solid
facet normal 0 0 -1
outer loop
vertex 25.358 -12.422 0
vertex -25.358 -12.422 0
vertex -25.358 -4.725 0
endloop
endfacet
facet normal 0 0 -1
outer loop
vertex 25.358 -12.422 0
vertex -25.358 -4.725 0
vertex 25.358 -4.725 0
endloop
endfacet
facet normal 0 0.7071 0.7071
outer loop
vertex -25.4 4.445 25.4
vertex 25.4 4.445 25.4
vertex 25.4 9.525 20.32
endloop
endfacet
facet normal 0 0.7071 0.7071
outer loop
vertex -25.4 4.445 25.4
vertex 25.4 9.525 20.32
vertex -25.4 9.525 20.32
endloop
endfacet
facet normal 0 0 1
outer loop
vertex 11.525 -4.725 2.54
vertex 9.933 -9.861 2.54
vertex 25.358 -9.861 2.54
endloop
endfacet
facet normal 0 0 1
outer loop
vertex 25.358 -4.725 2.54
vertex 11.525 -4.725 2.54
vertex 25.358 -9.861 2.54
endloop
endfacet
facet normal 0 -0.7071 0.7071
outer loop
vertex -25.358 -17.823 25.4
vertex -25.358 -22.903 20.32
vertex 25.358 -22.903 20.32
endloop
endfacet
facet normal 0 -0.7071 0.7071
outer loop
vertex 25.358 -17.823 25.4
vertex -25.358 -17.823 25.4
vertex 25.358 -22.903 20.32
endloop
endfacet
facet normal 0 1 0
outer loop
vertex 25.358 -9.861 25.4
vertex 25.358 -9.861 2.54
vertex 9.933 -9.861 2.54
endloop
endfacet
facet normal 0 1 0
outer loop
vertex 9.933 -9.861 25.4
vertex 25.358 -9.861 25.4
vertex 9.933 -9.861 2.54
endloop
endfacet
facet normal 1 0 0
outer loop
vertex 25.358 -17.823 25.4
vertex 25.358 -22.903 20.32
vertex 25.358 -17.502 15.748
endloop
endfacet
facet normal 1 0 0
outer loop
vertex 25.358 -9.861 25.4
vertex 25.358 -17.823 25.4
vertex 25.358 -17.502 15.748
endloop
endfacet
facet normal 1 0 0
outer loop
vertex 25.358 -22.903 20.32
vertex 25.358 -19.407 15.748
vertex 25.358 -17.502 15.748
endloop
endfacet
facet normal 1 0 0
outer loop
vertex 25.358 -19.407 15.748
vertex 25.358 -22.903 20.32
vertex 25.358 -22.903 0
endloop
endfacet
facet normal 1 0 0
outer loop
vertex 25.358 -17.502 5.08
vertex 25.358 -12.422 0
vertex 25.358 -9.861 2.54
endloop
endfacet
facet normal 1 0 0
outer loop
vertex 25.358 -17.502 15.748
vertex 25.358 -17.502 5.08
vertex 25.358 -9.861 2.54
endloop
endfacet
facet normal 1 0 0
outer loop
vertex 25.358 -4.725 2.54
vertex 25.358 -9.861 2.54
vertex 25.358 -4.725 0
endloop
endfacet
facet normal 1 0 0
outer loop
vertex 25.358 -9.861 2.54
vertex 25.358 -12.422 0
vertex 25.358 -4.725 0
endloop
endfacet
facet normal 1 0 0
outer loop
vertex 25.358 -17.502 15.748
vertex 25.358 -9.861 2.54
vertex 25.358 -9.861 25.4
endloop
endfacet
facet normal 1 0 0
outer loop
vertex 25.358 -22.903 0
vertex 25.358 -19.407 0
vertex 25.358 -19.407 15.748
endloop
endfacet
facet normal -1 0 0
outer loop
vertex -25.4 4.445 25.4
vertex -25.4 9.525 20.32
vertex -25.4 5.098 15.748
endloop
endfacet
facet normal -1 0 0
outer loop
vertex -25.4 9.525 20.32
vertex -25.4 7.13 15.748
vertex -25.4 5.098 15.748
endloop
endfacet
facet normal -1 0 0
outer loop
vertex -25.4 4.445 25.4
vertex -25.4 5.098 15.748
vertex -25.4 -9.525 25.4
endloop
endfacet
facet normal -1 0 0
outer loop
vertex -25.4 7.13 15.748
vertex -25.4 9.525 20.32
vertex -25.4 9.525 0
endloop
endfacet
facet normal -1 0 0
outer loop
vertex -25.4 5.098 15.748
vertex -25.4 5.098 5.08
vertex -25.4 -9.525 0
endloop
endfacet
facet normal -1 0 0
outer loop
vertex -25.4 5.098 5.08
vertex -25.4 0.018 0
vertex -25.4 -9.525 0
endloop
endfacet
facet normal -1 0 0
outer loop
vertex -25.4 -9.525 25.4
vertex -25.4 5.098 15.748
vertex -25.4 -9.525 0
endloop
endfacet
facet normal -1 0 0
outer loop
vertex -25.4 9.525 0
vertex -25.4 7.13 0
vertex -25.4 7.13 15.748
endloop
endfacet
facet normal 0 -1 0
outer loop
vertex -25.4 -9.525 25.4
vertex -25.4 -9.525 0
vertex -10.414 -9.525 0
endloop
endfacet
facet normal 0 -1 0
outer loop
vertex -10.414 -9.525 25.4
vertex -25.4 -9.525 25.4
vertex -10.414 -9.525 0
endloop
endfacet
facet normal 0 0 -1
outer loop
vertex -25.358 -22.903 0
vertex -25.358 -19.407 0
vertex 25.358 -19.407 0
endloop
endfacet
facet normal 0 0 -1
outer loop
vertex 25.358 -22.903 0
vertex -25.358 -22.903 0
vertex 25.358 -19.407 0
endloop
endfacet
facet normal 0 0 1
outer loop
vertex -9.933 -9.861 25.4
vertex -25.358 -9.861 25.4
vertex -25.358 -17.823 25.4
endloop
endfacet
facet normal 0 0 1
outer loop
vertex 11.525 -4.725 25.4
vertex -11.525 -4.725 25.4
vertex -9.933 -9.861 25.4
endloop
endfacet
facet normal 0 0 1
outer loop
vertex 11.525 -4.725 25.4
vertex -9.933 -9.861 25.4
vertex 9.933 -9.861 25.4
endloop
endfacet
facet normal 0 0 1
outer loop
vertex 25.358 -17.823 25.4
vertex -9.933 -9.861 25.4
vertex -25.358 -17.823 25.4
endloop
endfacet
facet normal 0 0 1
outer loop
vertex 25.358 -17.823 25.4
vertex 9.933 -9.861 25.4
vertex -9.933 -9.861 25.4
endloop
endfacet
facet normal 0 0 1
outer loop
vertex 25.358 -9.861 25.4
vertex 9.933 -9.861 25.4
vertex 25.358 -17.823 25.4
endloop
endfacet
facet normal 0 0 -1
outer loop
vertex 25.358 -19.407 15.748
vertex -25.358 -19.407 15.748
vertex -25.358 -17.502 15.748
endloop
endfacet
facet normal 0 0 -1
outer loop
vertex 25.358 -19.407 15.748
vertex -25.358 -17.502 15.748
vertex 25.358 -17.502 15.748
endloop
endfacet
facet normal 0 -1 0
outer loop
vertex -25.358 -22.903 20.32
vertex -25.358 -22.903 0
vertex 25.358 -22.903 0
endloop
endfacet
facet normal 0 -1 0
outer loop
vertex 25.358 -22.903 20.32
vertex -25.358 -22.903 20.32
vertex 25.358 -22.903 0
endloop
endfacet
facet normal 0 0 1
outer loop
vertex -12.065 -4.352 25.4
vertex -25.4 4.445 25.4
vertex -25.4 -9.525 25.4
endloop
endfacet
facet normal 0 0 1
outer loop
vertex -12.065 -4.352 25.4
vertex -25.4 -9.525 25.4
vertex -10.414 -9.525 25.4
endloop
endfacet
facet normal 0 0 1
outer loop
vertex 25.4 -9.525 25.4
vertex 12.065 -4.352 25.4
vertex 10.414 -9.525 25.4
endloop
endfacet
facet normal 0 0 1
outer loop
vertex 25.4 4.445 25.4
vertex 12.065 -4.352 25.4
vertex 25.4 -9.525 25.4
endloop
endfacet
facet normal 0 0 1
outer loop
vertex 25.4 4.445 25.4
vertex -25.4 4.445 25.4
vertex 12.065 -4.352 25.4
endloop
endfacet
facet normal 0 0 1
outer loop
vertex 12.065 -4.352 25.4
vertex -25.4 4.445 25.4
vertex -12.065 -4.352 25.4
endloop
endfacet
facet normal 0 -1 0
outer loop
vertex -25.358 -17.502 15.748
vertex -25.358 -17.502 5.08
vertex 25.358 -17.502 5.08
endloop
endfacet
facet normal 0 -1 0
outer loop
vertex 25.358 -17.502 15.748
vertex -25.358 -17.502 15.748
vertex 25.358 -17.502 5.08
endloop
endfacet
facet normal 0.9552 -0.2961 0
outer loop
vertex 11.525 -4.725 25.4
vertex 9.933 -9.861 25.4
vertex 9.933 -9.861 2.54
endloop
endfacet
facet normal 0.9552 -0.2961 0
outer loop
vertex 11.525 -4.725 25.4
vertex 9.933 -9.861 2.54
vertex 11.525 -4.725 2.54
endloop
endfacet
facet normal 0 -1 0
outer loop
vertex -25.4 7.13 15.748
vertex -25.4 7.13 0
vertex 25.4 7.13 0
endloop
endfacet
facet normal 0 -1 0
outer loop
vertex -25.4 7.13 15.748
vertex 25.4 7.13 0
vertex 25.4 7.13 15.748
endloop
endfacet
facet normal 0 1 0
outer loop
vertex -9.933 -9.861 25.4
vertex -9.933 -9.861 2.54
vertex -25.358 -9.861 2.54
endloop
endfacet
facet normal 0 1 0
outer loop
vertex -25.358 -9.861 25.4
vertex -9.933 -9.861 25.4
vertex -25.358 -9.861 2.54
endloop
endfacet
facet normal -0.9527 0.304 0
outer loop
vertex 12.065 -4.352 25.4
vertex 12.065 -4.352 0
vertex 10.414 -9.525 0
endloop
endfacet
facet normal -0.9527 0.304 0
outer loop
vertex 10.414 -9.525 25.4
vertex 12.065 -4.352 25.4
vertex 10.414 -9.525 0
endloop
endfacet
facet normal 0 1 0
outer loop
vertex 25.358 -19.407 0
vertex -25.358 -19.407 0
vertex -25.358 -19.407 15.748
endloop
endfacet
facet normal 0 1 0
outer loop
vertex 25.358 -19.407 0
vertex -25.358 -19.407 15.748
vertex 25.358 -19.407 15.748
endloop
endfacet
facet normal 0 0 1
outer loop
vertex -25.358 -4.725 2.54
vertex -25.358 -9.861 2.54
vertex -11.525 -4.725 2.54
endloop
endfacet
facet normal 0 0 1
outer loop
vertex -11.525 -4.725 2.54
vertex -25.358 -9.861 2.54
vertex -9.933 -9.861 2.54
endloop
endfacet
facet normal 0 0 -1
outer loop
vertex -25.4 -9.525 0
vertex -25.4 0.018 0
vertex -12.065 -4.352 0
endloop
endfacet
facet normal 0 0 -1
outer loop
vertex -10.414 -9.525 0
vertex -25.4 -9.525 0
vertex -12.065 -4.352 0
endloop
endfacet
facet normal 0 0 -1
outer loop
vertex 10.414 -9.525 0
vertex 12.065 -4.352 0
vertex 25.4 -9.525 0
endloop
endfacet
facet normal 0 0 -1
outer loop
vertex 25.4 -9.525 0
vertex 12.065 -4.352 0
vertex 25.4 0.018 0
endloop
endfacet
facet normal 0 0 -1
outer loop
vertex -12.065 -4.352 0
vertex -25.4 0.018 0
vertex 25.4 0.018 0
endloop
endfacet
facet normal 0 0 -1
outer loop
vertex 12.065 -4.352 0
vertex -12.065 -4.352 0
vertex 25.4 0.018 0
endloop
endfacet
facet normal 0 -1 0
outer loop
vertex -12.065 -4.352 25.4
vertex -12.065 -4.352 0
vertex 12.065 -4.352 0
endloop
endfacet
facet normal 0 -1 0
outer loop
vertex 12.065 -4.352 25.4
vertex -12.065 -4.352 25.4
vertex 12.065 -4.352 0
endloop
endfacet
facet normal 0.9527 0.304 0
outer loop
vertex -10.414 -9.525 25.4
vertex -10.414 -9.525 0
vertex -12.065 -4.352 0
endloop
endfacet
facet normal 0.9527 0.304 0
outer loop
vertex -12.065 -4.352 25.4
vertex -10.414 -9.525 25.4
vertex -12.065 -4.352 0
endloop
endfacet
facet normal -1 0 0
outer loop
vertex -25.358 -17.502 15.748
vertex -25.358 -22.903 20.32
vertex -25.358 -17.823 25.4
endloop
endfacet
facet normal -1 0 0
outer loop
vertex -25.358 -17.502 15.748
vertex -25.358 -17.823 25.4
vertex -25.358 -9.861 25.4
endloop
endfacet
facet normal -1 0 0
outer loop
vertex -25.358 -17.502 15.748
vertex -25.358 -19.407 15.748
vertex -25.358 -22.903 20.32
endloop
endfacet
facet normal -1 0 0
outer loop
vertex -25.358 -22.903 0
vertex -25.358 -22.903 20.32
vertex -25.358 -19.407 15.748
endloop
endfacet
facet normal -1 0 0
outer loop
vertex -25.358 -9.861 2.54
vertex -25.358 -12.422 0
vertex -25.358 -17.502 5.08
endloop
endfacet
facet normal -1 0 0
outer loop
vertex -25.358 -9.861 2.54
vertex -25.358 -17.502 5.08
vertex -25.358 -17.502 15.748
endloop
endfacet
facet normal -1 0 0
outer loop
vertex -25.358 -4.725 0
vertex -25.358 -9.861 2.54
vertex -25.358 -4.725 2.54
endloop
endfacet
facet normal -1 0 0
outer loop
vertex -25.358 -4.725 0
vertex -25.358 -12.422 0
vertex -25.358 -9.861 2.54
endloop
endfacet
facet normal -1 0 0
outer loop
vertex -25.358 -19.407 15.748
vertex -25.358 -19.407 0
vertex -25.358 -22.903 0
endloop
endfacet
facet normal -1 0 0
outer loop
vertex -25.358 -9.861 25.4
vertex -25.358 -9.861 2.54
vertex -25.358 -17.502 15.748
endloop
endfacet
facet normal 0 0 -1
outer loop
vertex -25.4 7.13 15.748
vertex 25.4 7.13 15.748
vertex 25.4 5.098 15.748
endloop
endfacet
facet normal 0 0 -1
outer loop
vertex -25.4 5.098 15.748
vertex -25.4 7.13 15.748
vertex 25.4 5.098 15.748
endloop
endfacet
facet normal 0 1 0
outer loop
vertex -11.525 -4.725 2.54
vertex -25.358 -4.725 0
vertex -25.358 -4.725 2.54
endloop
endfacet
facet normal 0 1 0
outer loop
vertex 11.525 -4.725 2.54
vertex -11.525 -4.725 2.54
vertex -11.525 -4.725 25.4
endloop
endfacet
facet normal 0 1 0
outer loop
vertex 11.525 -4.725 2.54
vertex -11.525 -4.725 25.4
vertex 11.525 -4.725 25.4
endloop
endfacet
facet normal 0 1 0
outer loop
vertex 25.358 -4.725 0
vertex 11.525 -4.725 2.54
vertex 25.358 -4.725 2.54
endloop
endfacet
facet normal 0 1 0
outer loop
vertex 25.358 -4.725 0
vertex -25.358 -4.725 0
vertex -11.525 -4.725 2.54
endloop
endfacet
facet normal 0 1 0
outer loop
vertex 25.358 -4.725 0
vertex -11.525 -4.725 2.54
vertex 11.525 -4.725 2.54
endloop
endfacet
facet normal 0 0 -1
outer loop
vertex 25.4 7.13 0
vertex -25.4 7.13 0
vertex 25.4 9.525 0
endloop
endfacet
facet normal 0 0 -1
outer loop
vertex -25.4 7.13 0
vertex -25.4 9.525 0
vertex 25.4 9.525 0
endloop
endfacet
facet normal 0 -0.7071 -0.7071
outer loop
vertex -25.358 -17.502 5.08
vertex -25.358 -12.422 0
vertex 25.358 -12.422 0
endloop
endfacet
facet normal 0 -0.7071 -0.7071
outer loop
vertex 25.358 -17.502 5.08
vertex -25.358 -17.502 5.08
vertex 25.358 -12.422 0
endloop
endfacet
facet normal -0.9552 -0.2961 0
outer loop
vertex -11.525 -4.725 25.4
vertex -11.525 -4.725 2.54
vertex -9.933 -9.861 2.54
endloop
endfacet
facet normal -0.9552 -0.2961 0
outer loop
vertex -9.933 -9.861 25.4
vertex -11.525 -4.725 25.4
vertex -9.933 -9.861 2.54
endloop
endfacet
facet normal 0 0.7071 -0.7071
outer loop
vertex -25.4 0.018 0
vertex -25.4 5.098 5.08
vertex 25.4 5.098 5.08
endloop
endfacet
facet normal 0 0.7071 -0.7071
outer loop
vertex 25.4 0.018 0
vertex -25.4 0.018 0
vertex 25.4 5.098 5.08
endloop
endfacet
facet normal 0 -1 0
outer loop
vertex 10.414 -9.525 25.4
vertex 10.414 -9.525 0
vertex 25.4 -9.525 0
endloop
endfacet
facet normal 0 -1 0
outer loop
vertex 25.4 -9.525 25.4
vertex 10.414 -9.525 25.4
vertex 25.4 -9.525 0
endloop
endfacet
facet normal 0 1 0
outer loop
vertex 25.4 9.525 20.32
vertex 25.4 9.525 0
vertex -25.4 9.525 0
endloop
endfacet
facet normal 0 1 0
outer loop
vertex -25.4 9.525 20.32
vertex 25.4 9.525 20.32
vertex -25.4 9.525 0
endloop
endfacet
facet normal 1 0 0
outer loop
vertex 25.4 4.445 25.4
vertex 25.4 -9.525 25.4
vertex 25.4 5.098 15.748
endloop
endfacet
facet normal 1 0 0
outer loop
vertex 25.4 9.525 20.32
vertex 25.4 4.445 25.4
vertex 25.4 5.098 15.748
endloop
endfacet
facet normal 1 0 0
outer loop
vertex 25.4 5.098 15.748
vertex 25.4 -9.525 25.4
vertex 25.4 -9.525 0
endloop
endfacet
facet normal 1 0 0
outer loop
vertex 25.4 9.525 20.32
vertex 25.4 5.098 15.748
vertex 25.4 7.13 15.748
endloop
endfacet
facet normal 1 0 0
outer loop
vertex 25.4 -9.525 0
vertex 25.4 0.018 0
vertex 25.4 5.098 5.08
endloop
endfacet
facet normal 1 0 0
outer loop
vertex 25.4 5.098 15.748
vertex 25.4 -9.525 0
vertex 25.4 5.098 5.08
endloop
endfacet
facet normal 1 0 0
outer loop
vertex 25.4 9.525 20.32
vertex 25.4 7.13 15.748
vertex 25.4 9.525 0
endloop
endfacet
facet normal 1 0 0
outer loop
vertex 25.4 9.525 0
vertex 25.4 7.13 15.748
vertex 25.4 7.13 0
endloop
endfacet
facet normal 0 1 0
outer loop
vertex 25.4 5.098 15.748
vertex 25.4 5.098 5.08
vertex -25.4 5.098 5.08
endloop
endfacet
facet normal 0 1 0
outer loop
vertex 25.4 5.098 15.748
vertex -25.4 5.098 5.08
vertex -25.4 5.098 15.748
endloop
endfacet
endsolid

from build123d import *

# Parameters (mm, degrees)
F1_DEPTH  = 25.4
F2_W      = 2.032
F2_H      = 15.748
F3_DEPTH  = 68.326
F4_SIZE   = 5.08
F6_DEPTH  = 25.4
F7_W      = 50.7155433297
F7_H      = 1.905
F8_DEPTH  = 15.748
F10_DEPTH = 2.54
F11_SIZE  = 5.08


with BuildPart() as f1:
    # F0 (on Top) → F1 (new body)
    with BuildSketch(Plane.XY):
        Polygon((25.4, -9.525), (25.4, 9.525), (-25.4, 9.525), (-25.4, -9.525), (-12.0650689502, -9.525), (-10.414, -9.525), (-12.0649310498, -4.3516255037), (12.0649310498, -4.3516255037), (10.414, -9.525), (12.0649310498, -9.525), align=None)
    extrude(amount=F1_DEPTH)

    # F2 (on face) → F3 (cut)
    with BuildSketch(Plane(origin=(-25.4, 0, 0), x_dir=(0, -1, 0), z_dir=(-1, 0, 0))):
        with Locations((-6.1136542883, 7.874)):
            Rectangle(F2_W, F2_H)
    extrude(amount=-F3_DEPTH, mode=Mode.SUBTRACT)

    # F4
    f4_edges = [f1.edges().sort_by_distance(p)[0] for p in [
        (0, 5.097654, 0),
        (0, 9.525, 25.4),
    ]]
    chamfer(f4_edges, length=F4_SIZE)


with BuildPart() as f6:
    # F5 (on Top) → F6 (new body)
    with BuildSketch(Plane.XY):
        Polygon((-9.932962208, -9.8606804386), (-25.3577716649, -9.8606804386), (-25.3577716649, -22.9027178138), (0, -22.9027178138), (25.3577716649, -22.9027178138), (25.3577716649, -9.8606804386), (9.932962208, -9.8606804386), (11.5252688949, -4.7248839401), (0, -4.7248839401), (-11.5252688949, -4.7248839401), align=None)
    extrude(amount=F6_DEPTH)

    # F7 (on face) → F8 (cut)
    with BuildSketch(Plane(origin=(0, 0, 0), x_dir=(1, 0, 0), z_dir=(0, 0, -1))):
        with Locations((0, 18.4544204617)):
            Rectangle(F7_W, F7_H)
    extrude(amount=-F8_DEPTH, mode=Mode.SUBTRACT)

    # F9 (on face) → F10 (join)
    with BuildSketch(Plane(origin=(0, 0, 0), x_dir=(1, 0, 0), z_dir=(0, 0, -1))):
        Polygon((-9.932962208, 9.8606804386), (-25.3577716649, 9.8606804386), (-25.3577716649, 4.7248839401), (-11.5252688949, 4.7248839401), align=None)
        Polygon((25.3577716649, 9.8606804386), (9.932962208, 9.8606804386), (11.5252688949, 4.7248839401), (25.3577716649, 4.7248839401), align=None)
    extrude(amount=-F10_DEPTH)

    # F11
    f11_edges = [f6.edges().sort_by_distance(p)[0] for p in [
        (0, -17.50192, 0),
        (0, -22.902718, 25.4),
    ]]
    chamfer(f11_edges, length=F11_SIZE)


solid = Compound([f1.part, f6.part])
